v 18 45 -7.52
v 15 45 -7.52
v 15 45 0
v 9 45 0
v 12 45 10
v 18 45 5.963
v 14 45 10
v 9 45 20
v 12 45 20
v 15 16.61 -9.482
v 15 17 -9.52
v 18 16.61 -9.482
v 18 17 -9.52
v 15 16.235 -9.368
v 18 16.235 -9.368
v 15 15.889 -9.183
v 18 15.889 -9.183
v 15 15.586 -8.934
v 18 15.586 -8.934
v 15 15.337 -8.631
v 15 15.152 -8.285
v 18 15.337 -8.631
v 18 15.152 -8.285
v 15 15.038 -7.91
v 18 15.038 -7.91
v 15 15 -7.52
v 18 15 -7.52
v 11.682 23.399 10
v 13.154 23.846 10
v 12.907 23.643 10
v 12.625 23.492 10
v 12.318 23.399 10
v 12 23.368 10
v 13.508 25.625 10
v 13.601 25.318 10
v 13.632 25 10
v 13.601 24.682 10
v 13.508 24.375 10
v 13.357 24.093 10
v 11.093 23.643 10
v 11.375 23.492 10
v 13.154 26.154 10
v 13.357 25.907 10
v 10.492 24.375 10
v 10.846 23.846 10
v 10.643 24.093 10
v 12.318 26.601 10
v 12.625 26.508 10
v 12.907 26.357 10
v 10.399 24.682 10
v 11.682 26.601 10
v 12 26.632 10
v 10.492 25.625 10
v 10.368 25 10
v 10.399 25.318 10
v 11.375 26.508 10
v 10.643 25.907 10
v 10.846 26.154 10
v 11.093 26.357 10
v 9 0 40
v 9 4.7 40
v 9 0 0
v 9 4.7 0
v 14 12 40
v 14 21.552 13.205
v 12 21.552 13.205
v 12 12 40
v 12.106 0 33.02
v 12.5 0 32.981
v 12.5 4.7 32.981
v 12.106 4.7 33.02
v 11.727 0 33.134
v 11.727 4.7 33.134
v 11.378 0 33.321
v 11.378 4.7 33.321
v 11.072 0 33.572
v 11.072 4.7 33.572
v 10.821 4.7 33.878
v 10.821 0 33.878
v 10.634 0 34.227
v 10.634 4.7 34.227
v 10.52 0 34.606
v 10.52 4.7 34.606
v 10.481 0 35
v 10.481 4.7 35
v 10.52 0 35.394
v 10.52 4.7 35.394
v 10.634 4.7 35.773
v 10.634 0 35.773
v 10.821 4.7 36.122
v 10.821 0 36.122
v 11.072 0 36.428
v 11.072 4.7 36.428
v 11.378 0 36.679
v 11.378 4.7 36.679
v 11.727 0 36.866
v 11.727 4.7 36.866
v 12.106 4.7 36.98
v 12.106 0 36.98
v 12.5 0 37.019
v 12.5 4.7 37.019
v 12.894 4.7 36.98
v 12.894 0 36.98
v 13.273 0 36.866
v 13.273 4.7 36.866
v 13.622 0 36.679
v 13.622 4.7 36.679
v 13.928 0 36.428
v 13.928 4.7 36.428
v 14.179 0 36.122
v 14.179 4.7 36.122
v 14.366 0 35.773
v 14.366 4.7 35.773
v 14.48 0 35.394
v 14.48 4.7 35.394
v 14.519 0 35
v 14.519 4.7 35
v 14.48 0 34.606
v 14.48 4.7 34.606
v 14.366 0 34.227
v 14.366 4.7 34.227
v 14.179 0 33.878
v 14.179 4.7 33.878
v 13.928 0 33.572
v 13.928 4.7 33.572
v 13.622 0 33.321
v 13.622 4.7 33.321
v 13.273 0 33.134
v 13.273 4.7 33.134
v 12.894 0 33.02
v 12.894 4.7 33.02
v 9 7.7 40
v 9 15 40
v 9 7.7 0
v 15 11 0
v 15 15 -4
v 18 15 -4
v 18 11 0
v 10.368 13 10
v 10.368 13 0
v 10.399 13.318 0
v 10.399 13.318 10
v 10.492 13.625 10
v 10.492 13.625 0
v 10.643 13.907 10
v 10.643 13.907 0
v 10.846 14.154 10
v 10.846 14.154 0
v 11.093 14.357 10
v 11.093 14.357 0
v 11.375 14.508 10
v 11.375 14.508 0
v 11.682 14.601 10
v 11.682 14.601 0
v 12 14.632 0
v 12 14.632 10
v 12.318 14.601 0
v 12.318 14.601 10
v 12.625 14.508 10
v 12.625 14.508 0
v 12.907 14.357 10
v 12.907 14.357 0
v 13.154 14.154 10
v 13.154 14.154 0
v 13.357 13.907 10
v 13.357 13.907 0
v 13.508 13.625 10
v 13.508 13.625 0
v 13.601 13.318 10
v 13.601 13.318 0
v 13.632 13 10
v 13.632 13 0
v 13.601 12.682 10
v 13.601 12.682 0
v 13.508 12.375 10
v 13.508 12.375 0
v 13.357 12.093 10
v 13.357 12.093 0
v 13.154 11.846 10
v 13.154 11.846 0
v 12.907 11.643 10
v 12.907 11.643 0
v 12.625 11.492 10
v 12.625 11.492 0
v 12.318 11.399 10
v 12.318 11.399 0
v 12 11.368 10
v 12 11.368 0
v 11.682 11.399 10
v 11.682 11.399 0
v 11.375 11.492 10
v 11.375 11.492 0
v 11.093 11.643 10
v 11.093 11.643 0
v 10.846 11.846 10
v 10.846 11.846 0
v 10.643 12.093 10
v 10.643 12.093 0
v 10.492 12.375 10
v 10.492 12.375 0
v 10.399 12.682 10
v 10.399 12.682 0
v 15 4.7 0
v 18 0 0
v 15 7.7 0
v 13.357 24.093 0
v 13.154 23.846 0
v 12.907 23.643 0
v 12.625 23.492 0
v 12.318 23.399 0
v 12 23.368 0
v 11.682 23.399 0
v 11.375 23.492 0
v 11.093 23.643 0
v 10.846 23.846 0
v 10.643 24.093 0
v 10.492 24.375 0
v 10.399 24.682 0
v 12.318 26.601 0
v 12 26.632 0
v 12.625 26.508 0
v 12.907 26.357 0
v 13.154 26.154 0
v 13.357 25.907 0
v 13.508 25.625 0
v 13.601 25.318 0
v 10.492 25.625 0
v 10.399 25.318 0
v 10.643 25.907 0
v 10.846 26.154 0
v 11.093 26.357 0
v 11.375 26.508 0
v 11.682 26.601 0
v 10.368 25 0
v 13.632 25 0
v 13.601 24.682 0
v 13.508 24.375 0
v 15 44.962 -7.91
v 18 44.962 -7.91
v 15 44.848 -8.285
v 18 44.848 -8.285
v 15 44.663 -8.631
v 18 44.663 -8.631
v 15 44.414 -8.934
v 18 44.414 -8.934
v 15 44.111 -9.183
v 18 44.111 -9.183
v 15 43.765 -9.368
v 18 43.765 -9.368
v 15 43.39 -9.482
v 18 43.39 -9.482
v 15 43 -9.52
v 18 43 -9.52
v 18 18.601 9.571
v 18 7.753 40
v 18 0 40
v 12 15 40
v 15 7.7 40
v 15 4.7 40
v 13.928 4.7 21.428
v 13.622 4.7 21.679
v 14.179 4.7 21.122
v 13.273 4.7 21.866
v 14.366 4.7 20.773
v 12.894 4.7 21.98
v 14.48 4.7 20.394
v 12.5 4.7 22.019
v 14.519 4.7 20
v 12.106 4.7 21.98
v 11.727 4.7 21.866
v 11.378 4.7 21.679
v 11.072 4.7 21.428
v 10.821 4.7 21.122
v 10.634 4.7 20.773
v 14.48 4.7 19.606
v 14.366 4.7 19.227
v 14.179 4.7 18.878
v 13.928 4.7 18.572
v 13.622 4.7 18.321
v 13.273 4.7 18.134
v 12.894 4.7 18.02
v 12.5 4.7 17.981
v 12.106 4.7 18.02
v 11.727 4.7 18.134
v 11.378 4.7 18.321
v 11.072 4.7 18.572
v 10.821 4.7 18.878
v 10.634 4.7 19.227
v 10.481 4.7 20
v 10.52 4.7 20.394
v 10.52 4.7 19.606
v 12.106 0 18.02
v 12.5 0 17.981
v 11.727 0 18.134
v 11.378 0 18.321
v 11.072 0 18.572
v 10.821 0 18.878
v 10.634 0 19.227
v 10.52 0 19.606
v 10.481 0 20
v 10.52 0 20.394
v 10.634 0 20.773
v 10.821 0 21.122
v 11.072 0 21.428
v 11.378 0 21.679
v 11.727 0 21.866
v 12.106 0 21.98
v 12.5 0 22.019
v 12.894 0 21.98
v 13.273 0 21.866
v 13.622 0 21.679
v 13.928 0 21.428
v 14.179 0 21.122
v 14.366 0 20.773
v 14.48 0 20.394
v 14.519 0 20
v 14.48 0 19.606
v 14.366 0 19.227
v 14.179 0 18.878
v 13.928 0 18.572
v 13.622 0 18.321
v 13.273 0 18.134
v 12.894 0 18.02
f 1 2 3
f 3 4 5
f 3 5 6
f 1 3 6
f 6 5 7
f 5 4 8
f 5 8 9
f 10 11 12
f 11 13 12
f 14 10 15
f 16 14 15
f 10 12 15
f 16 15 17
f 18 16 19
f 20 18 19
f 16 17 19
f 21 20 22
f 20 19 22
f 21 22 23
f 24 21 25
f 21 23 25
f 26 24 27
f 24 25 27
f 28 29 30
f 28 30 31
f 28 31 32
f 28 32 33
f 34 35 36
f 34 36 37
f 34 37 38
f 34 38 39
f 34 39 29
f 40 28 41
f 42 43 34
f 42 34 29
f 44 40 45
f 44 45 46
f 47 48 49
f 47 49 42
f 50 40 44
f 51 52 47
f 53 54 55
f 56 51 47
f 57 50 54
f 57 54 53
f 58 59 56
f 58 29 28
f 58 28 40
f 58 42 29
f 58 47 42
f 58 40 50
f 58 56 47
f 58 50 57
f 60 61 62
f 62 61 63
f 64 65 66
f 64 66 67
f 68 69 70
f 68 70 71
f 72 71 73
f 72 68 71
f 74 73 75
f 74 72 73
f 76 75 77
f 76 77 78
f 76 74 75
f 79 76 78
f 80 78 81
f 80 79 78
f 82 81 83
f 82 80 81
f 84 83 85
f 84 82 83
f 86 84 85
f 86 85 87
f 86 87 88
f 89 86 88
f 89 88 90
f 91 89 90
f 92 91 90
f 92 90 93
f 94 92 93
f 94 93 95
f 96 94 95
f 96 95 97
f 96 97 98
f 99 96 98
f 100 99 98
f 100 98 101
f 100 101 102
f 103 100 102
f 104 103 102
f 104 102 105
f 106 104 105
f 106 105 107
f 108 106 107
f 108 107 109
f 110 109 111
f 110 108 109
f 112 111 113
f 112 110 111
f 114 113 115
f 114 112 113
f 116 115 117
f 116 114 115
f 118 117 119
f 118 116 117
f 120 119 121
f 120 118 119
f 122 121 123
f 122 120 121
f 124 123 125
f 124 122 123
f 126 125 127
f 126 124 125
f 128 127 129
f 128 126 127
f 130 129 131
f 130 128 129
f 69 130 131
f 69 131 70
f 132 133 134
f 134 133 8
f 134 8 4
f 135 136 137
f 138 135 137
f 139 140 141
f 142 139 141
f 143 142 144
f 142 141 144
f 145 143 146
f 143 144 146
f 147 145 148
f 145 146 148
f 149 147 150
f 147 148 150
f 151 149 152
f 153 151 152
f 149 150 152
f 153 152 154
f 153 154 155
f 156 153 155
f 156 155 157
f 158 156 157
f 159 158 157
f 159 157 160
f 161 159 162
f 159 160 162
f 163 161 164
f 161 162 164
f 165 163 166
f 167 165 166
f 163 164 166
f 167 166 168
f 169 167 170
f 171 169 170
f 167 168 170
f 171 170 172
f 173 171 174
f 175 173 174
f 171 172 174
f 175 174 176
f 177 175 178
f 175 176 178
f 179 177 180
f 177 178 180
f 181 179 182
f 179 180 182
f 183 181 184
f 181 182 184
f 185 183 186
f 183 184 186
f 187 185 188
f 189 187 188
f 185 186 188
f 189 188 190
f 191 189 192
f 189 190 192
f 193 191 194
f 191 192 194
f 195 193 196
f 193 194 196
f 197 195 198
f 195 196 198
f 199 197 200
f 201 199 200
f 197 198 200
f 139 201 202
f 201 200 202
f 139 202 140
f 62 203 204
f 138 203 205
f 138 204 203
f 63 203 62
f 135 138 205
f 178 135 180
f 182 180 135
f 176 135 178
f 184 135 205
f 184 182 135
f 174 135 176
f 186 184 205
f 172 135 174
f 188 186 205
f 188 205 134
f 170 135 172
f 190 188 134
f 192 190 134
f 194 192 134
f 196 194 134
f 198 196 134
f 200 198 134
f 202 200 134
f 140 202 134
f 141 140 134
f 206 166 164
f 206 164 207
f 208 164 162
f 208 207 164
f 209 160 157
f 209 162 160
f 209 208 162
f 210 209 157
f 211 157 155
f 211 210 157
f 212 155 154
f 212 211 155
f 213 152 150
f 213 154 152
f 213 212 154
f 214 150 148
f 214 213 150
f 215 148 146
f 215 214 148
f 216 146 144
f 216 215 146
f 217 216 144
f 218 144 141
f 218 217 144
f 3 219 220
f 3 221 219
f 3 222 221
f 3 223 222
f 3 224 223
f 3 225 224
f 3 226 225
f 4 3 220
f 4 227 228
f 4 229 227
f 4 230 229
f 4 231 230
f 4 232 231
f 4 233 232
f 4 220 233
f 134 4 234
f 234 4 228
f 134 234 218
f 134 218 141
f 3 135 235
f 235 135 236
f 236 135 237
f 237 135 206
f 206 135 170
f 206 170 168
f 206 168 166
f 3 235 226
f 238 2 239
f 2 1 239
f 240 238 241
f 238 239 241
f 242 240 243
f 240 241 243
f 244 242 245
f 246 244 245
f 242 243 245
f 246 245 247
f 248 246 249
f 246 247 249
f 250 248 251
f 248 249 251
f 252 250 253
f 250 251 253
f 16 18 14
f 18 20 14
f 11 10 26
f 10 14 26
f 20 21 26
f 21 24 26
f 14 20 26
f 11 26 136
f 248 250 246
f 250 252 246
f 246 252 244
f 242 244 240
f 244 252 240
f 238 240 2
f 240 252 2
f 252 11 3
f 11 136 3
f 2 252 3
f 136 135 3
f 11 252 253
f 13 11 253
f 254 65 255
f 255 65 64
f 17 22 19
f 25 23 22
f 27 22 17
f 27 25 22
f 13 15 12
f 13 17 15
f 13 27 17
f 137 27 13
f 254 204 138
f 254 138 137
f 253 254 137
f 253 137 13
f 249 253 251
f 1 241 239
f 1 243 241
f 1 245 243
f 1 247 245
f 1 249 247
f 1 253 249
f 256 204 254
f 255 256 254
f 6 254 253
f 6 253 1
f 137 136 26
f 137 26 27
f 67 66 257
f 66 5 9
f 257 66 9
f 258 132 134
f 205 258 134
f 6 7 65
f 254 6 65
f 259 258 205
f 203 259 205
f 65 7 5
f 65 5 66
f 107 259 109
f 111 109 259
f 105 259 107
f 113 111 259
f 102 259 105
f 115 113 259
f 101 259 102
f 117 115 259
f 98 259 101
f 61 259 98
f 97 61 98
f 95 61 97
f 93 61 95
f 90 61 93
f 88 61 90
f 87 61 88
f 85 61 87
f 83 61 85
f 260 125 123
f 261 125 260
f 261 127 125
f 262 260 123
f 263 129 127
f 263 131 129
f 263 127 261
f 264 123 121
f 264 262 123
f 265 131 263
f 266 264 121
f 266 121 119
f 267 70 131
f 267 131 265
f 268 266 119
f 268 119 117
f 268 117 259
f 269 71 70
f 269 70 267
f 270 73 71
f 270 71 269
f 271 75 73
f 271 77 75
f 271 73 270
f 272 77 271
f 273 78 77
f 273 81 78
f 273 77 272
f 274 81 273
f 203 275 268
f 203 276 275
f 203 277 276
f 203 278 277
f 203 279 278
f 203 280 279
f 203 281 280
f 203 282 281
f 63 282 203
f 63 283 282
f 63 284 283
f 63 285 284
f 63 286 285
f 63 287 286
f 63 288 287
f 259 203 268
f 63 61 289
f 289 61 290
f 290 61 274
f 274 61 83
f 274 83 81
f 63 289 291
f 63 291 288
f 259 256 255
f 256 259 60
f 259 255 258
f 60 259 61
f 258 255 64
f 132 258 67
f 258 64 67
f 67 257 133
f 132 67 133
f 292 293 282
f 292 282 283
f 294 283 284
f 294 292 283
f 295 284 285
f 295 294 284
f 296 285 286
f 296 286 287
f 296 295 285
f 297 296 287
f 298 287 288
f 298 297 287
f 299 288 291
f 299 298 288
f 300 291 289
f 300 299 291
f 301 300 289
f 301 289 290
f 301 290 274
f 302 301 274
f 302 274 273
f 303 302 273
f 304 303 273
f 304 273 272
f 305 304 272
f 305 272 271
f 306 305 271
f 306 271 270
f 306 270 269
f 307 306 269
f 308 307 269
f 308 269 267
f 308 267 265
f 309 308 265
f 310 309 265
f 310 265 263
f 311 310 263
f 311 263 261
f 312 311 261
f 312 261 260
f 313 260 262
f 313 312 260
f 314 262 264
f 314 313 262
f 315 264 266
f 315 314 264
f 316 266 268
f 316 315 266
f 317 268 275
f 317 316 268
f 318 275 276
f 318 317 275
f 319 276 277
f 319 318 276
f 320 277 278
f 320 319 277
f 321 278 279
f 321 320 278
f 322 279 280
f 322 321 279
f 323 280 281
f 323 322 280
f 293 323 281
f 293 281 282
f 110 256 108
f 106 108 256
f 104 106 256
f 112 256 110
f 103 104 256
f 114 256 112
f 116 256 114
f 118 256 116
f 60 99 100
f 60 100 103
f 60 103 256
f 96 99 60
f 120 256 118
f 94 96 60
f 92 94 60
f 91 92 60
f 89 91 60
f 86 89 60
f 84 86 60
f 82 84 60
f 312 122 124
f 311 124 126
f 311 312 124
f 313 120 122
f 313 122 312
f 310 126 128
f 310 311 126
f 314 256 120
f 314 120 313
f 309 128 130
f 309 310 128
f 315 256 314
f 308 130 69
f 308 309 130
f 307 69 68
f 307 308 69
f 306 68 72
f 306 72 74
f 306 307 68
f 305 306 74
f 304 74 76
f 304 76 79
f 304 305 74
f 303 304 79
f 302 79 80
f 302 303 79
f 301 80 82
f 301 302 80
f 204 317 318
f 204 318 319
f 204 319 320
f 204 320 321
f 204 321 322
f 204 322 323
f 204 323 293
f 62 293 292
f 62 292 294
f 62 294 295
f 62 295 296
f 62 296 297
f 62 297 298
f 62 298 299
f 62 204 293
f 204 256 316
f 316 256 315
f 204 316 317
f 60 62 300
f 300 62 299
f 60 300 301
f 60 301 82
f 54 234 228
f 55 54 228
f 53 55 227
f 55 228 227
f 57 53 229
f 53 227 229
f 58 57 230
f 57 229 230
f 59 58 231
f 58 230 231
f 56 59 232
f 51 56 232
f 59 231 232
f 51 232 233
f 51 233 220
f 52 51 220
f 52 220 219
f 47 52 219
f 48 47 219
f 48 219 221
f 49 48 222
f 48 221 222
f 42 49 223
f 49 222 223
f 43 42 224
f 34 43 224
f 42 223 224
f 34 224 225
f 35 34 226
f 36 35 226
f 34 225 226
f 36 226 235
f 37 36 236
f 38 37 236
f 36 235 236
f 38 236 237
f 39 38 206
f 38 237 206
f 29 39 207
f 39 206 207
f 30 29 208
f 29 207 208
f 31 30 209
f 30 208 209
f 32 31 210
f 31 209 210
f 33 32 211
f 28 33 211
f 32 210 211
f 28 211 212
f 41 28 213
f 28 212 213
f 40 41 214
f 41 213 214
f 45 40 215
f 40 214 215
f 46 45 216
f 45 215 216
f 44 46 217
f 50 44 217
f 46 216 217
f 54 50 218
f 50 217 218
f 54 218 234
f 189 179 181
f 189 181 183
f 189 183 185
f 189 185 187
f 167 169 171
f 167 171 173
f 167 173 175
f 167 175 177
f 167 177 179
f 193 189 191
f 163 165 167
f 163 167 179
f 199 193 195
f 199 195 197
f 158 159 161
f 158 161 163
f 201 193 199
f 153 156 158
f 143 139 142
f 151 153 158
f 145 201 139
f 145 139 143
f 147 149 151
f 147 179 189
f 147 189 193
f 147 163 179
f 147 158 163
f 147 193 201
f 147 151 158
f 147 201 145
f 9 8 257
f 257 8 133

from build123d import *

# Parameters (mm, degrees)
SKETCH1_W           = 9
SKETCH1_H           = 45
SKETCH1_R           = 1.63195
BOSS_EXTRUDE1_DEPTH = 40
SKETCH1_3_R         = 1.63195
CUT_EXTRUDE1_DEPTH  = 10
SKETCH2_W           = 40
SKETCH2_H           = 3
CUT_EXTRUDE2_DEPTH  = 6
CUT_EXTRUDE3_DEPTH  = 9
CUT_EXTRUDE4_DEPTH  = 6
CHAMFER2_SIZE       = 4
SKETCH6_R           = 2.0193
CUT_EXTRUDE5_DEPTH  = 6
SKETCH7_W           = 3
SKETCH7_H           = 30
BOSS_EXTRUDE3_DEPTH = 9.52
CHAMFER3_SIZE       = 4
FILLET1_R           = 2
SKETCH8_W           = 73.917674983
SKETCH8_H           = 61.996597993
CUT_EXTRUDE6_DEPTH  = 9


with BuildPart() as part:
    # Sketch1 → Boss-Extrude1 (new body)
    # profile 1 of 3: a face of its own
    with BuildSketch(Plane.XY):
        with Locations((4.5, 22.5)):
            Rectangle(SKETCH1_W, SKETCH1_H)
        with Locations((6, 13)):
            Circle(SKETCH1_R, mode=Mode.SUBTRACT)
        with Locations((6, 25)):
            Circle(SKETCH1_R, mode=Mode.SUBTRACT)
    # profile 2 of 3: a face of its own
    with BuildSketch(Plane.XY):
        with Locations((6, 25)):
            Circle(SKETCH1_R)
    # profile 3 of 3: a face of its own
    with BuildSketch(Plane.XY):
        with Locations((6, 13)):
            Circle(SKETCH1_R)
    extrude(amount=BOSS_EXTRUDE1_DEPTH)

    # Sketch1<3> → Cut-Extrude1 (cut)
    with BuildSketch(Plane.XY):
        with Locations((6, 25)):
            Circle(SKETCH1_3_R)
        with Locations((6, 13)):
            Circle(SKETCH1_3_R)
    extrude(amount=CUT_EXTRUDE1_DEPTH, mode=Mode.SUBTRACT)

    # Sketch2 → Cut-Extrude2 (cut)
    with BuildSketch(Plane(origin=(9, 0, 0), x_dir=(0, 0, -1), z_dir=(1, 0, 0))):
        with Locations((-20, 6.2)):
            Rectangle(SKETCH2_W, SKETCH2_H)
    extrude(amount=-CUT_EXTRUDE2_DEPTH, mode=Mode.SUBTRACT)

    # Sketch3 → Cut-Extrude3 (cut)
    with BuildSketch(Plane(origin=(9, 0, 0), x_dir=(0, 0, -1), z_dir=(1, 0, 0))):
        Polygon((-20, 45), (-40, 15), (-48.379363257, 51.913157268), align=None)
    extrude(amount=-CUT_EXTRUDE3_DEPTH, mode=Mode.SUBTRACT)

    # Sketch5 → Cut-Extrude4 (cut)
    with BuildSketch(Plane.ZY):
        Polygon((20, 45), (10, 45), (13.204776383, 21.55213026), (40, 12), (40, 15), align=None)
    extrude(amount=-CUT_EXTRUDE4_DEPTH, mode=Mode.SUBTRACT)

    # Chamfer2
    chamfer2_edges = [part.edges().sort_by_distance(p)[0] for p in [
        (0, 33.27606513, 11.602388192),
        (0, 16.77606513, 26.602388192),
    ]]
    chamfer(chamfer2_edges, length=CHAMFER2_SIZE)

    # Sketch6 → Cut-Extrude5 (cut)
    with BuildSketch(Plane.XZ):
        with Locations(Location((5.5, 35, 0), (0, 0, 270))):
            Circle(SKETCH6_R)
        with Locations(Location((5.5, 20, 0), (0, 0, 270))):
            Circle(SKETCH6_R)
    extrude(amount=-CUT_EXTRUDE5_DEPTH, mode=Mode.SUBTRACT)

    # Sketch7 → Boss-Extrude3 (add)
    with BuildSketch(Plane(origin=(0, 0, 0), x_dir=(-1, 0, 0), z_dir=(0, 0, -1))):
        with Locations((-1.5, 30)):
            Rectangle(SKETCH7_W, SKETCH7_H)
    extrude(amount=BOSS_EXTRUDE3_DEPTH)

    # Chamfer3
    chamfer3_edges = [part.edges().sort_by_distance(p)[0] for p in [
        (1.5, 15, 0),
    ]]
    chamfer(chamfer3_edges, length=CHAMFER3_SIZE)

    # Fillet1
    fillet1_edges = [part.edges().sort_by_distance(p)[0] for p in [
        (1.5, 45, -9.52),
        (1.5, 15, -9.52),
    ]]
    fillet(fillet1_edges, radius=FILLET1_R)

    # Mirror1: part across plane


with BuildPart() as part_1:
    add(part.part)
    add(part.part.mirror(Plane(origin=(9, 0, 40), x_dir=(0, 0, 1), z_dir=(-1, 0, 0))))

    # Sketch8 → Cut-Extrude6 (cut)
    with BuildSketch(Plane(origin=(0, 0, 0), x_dir=(0, 0, -1), z_dir=(1, 0, 0))):
        with Locations((-12.663539667, 19.880173389)):
            Rectangle(SKETCH8_W, SKETCH8_H)
    extrude(amount=CUT_EXTRUDE6_DEPTH, mode=Mode.SUBTRACT)


solid = part_1.part
